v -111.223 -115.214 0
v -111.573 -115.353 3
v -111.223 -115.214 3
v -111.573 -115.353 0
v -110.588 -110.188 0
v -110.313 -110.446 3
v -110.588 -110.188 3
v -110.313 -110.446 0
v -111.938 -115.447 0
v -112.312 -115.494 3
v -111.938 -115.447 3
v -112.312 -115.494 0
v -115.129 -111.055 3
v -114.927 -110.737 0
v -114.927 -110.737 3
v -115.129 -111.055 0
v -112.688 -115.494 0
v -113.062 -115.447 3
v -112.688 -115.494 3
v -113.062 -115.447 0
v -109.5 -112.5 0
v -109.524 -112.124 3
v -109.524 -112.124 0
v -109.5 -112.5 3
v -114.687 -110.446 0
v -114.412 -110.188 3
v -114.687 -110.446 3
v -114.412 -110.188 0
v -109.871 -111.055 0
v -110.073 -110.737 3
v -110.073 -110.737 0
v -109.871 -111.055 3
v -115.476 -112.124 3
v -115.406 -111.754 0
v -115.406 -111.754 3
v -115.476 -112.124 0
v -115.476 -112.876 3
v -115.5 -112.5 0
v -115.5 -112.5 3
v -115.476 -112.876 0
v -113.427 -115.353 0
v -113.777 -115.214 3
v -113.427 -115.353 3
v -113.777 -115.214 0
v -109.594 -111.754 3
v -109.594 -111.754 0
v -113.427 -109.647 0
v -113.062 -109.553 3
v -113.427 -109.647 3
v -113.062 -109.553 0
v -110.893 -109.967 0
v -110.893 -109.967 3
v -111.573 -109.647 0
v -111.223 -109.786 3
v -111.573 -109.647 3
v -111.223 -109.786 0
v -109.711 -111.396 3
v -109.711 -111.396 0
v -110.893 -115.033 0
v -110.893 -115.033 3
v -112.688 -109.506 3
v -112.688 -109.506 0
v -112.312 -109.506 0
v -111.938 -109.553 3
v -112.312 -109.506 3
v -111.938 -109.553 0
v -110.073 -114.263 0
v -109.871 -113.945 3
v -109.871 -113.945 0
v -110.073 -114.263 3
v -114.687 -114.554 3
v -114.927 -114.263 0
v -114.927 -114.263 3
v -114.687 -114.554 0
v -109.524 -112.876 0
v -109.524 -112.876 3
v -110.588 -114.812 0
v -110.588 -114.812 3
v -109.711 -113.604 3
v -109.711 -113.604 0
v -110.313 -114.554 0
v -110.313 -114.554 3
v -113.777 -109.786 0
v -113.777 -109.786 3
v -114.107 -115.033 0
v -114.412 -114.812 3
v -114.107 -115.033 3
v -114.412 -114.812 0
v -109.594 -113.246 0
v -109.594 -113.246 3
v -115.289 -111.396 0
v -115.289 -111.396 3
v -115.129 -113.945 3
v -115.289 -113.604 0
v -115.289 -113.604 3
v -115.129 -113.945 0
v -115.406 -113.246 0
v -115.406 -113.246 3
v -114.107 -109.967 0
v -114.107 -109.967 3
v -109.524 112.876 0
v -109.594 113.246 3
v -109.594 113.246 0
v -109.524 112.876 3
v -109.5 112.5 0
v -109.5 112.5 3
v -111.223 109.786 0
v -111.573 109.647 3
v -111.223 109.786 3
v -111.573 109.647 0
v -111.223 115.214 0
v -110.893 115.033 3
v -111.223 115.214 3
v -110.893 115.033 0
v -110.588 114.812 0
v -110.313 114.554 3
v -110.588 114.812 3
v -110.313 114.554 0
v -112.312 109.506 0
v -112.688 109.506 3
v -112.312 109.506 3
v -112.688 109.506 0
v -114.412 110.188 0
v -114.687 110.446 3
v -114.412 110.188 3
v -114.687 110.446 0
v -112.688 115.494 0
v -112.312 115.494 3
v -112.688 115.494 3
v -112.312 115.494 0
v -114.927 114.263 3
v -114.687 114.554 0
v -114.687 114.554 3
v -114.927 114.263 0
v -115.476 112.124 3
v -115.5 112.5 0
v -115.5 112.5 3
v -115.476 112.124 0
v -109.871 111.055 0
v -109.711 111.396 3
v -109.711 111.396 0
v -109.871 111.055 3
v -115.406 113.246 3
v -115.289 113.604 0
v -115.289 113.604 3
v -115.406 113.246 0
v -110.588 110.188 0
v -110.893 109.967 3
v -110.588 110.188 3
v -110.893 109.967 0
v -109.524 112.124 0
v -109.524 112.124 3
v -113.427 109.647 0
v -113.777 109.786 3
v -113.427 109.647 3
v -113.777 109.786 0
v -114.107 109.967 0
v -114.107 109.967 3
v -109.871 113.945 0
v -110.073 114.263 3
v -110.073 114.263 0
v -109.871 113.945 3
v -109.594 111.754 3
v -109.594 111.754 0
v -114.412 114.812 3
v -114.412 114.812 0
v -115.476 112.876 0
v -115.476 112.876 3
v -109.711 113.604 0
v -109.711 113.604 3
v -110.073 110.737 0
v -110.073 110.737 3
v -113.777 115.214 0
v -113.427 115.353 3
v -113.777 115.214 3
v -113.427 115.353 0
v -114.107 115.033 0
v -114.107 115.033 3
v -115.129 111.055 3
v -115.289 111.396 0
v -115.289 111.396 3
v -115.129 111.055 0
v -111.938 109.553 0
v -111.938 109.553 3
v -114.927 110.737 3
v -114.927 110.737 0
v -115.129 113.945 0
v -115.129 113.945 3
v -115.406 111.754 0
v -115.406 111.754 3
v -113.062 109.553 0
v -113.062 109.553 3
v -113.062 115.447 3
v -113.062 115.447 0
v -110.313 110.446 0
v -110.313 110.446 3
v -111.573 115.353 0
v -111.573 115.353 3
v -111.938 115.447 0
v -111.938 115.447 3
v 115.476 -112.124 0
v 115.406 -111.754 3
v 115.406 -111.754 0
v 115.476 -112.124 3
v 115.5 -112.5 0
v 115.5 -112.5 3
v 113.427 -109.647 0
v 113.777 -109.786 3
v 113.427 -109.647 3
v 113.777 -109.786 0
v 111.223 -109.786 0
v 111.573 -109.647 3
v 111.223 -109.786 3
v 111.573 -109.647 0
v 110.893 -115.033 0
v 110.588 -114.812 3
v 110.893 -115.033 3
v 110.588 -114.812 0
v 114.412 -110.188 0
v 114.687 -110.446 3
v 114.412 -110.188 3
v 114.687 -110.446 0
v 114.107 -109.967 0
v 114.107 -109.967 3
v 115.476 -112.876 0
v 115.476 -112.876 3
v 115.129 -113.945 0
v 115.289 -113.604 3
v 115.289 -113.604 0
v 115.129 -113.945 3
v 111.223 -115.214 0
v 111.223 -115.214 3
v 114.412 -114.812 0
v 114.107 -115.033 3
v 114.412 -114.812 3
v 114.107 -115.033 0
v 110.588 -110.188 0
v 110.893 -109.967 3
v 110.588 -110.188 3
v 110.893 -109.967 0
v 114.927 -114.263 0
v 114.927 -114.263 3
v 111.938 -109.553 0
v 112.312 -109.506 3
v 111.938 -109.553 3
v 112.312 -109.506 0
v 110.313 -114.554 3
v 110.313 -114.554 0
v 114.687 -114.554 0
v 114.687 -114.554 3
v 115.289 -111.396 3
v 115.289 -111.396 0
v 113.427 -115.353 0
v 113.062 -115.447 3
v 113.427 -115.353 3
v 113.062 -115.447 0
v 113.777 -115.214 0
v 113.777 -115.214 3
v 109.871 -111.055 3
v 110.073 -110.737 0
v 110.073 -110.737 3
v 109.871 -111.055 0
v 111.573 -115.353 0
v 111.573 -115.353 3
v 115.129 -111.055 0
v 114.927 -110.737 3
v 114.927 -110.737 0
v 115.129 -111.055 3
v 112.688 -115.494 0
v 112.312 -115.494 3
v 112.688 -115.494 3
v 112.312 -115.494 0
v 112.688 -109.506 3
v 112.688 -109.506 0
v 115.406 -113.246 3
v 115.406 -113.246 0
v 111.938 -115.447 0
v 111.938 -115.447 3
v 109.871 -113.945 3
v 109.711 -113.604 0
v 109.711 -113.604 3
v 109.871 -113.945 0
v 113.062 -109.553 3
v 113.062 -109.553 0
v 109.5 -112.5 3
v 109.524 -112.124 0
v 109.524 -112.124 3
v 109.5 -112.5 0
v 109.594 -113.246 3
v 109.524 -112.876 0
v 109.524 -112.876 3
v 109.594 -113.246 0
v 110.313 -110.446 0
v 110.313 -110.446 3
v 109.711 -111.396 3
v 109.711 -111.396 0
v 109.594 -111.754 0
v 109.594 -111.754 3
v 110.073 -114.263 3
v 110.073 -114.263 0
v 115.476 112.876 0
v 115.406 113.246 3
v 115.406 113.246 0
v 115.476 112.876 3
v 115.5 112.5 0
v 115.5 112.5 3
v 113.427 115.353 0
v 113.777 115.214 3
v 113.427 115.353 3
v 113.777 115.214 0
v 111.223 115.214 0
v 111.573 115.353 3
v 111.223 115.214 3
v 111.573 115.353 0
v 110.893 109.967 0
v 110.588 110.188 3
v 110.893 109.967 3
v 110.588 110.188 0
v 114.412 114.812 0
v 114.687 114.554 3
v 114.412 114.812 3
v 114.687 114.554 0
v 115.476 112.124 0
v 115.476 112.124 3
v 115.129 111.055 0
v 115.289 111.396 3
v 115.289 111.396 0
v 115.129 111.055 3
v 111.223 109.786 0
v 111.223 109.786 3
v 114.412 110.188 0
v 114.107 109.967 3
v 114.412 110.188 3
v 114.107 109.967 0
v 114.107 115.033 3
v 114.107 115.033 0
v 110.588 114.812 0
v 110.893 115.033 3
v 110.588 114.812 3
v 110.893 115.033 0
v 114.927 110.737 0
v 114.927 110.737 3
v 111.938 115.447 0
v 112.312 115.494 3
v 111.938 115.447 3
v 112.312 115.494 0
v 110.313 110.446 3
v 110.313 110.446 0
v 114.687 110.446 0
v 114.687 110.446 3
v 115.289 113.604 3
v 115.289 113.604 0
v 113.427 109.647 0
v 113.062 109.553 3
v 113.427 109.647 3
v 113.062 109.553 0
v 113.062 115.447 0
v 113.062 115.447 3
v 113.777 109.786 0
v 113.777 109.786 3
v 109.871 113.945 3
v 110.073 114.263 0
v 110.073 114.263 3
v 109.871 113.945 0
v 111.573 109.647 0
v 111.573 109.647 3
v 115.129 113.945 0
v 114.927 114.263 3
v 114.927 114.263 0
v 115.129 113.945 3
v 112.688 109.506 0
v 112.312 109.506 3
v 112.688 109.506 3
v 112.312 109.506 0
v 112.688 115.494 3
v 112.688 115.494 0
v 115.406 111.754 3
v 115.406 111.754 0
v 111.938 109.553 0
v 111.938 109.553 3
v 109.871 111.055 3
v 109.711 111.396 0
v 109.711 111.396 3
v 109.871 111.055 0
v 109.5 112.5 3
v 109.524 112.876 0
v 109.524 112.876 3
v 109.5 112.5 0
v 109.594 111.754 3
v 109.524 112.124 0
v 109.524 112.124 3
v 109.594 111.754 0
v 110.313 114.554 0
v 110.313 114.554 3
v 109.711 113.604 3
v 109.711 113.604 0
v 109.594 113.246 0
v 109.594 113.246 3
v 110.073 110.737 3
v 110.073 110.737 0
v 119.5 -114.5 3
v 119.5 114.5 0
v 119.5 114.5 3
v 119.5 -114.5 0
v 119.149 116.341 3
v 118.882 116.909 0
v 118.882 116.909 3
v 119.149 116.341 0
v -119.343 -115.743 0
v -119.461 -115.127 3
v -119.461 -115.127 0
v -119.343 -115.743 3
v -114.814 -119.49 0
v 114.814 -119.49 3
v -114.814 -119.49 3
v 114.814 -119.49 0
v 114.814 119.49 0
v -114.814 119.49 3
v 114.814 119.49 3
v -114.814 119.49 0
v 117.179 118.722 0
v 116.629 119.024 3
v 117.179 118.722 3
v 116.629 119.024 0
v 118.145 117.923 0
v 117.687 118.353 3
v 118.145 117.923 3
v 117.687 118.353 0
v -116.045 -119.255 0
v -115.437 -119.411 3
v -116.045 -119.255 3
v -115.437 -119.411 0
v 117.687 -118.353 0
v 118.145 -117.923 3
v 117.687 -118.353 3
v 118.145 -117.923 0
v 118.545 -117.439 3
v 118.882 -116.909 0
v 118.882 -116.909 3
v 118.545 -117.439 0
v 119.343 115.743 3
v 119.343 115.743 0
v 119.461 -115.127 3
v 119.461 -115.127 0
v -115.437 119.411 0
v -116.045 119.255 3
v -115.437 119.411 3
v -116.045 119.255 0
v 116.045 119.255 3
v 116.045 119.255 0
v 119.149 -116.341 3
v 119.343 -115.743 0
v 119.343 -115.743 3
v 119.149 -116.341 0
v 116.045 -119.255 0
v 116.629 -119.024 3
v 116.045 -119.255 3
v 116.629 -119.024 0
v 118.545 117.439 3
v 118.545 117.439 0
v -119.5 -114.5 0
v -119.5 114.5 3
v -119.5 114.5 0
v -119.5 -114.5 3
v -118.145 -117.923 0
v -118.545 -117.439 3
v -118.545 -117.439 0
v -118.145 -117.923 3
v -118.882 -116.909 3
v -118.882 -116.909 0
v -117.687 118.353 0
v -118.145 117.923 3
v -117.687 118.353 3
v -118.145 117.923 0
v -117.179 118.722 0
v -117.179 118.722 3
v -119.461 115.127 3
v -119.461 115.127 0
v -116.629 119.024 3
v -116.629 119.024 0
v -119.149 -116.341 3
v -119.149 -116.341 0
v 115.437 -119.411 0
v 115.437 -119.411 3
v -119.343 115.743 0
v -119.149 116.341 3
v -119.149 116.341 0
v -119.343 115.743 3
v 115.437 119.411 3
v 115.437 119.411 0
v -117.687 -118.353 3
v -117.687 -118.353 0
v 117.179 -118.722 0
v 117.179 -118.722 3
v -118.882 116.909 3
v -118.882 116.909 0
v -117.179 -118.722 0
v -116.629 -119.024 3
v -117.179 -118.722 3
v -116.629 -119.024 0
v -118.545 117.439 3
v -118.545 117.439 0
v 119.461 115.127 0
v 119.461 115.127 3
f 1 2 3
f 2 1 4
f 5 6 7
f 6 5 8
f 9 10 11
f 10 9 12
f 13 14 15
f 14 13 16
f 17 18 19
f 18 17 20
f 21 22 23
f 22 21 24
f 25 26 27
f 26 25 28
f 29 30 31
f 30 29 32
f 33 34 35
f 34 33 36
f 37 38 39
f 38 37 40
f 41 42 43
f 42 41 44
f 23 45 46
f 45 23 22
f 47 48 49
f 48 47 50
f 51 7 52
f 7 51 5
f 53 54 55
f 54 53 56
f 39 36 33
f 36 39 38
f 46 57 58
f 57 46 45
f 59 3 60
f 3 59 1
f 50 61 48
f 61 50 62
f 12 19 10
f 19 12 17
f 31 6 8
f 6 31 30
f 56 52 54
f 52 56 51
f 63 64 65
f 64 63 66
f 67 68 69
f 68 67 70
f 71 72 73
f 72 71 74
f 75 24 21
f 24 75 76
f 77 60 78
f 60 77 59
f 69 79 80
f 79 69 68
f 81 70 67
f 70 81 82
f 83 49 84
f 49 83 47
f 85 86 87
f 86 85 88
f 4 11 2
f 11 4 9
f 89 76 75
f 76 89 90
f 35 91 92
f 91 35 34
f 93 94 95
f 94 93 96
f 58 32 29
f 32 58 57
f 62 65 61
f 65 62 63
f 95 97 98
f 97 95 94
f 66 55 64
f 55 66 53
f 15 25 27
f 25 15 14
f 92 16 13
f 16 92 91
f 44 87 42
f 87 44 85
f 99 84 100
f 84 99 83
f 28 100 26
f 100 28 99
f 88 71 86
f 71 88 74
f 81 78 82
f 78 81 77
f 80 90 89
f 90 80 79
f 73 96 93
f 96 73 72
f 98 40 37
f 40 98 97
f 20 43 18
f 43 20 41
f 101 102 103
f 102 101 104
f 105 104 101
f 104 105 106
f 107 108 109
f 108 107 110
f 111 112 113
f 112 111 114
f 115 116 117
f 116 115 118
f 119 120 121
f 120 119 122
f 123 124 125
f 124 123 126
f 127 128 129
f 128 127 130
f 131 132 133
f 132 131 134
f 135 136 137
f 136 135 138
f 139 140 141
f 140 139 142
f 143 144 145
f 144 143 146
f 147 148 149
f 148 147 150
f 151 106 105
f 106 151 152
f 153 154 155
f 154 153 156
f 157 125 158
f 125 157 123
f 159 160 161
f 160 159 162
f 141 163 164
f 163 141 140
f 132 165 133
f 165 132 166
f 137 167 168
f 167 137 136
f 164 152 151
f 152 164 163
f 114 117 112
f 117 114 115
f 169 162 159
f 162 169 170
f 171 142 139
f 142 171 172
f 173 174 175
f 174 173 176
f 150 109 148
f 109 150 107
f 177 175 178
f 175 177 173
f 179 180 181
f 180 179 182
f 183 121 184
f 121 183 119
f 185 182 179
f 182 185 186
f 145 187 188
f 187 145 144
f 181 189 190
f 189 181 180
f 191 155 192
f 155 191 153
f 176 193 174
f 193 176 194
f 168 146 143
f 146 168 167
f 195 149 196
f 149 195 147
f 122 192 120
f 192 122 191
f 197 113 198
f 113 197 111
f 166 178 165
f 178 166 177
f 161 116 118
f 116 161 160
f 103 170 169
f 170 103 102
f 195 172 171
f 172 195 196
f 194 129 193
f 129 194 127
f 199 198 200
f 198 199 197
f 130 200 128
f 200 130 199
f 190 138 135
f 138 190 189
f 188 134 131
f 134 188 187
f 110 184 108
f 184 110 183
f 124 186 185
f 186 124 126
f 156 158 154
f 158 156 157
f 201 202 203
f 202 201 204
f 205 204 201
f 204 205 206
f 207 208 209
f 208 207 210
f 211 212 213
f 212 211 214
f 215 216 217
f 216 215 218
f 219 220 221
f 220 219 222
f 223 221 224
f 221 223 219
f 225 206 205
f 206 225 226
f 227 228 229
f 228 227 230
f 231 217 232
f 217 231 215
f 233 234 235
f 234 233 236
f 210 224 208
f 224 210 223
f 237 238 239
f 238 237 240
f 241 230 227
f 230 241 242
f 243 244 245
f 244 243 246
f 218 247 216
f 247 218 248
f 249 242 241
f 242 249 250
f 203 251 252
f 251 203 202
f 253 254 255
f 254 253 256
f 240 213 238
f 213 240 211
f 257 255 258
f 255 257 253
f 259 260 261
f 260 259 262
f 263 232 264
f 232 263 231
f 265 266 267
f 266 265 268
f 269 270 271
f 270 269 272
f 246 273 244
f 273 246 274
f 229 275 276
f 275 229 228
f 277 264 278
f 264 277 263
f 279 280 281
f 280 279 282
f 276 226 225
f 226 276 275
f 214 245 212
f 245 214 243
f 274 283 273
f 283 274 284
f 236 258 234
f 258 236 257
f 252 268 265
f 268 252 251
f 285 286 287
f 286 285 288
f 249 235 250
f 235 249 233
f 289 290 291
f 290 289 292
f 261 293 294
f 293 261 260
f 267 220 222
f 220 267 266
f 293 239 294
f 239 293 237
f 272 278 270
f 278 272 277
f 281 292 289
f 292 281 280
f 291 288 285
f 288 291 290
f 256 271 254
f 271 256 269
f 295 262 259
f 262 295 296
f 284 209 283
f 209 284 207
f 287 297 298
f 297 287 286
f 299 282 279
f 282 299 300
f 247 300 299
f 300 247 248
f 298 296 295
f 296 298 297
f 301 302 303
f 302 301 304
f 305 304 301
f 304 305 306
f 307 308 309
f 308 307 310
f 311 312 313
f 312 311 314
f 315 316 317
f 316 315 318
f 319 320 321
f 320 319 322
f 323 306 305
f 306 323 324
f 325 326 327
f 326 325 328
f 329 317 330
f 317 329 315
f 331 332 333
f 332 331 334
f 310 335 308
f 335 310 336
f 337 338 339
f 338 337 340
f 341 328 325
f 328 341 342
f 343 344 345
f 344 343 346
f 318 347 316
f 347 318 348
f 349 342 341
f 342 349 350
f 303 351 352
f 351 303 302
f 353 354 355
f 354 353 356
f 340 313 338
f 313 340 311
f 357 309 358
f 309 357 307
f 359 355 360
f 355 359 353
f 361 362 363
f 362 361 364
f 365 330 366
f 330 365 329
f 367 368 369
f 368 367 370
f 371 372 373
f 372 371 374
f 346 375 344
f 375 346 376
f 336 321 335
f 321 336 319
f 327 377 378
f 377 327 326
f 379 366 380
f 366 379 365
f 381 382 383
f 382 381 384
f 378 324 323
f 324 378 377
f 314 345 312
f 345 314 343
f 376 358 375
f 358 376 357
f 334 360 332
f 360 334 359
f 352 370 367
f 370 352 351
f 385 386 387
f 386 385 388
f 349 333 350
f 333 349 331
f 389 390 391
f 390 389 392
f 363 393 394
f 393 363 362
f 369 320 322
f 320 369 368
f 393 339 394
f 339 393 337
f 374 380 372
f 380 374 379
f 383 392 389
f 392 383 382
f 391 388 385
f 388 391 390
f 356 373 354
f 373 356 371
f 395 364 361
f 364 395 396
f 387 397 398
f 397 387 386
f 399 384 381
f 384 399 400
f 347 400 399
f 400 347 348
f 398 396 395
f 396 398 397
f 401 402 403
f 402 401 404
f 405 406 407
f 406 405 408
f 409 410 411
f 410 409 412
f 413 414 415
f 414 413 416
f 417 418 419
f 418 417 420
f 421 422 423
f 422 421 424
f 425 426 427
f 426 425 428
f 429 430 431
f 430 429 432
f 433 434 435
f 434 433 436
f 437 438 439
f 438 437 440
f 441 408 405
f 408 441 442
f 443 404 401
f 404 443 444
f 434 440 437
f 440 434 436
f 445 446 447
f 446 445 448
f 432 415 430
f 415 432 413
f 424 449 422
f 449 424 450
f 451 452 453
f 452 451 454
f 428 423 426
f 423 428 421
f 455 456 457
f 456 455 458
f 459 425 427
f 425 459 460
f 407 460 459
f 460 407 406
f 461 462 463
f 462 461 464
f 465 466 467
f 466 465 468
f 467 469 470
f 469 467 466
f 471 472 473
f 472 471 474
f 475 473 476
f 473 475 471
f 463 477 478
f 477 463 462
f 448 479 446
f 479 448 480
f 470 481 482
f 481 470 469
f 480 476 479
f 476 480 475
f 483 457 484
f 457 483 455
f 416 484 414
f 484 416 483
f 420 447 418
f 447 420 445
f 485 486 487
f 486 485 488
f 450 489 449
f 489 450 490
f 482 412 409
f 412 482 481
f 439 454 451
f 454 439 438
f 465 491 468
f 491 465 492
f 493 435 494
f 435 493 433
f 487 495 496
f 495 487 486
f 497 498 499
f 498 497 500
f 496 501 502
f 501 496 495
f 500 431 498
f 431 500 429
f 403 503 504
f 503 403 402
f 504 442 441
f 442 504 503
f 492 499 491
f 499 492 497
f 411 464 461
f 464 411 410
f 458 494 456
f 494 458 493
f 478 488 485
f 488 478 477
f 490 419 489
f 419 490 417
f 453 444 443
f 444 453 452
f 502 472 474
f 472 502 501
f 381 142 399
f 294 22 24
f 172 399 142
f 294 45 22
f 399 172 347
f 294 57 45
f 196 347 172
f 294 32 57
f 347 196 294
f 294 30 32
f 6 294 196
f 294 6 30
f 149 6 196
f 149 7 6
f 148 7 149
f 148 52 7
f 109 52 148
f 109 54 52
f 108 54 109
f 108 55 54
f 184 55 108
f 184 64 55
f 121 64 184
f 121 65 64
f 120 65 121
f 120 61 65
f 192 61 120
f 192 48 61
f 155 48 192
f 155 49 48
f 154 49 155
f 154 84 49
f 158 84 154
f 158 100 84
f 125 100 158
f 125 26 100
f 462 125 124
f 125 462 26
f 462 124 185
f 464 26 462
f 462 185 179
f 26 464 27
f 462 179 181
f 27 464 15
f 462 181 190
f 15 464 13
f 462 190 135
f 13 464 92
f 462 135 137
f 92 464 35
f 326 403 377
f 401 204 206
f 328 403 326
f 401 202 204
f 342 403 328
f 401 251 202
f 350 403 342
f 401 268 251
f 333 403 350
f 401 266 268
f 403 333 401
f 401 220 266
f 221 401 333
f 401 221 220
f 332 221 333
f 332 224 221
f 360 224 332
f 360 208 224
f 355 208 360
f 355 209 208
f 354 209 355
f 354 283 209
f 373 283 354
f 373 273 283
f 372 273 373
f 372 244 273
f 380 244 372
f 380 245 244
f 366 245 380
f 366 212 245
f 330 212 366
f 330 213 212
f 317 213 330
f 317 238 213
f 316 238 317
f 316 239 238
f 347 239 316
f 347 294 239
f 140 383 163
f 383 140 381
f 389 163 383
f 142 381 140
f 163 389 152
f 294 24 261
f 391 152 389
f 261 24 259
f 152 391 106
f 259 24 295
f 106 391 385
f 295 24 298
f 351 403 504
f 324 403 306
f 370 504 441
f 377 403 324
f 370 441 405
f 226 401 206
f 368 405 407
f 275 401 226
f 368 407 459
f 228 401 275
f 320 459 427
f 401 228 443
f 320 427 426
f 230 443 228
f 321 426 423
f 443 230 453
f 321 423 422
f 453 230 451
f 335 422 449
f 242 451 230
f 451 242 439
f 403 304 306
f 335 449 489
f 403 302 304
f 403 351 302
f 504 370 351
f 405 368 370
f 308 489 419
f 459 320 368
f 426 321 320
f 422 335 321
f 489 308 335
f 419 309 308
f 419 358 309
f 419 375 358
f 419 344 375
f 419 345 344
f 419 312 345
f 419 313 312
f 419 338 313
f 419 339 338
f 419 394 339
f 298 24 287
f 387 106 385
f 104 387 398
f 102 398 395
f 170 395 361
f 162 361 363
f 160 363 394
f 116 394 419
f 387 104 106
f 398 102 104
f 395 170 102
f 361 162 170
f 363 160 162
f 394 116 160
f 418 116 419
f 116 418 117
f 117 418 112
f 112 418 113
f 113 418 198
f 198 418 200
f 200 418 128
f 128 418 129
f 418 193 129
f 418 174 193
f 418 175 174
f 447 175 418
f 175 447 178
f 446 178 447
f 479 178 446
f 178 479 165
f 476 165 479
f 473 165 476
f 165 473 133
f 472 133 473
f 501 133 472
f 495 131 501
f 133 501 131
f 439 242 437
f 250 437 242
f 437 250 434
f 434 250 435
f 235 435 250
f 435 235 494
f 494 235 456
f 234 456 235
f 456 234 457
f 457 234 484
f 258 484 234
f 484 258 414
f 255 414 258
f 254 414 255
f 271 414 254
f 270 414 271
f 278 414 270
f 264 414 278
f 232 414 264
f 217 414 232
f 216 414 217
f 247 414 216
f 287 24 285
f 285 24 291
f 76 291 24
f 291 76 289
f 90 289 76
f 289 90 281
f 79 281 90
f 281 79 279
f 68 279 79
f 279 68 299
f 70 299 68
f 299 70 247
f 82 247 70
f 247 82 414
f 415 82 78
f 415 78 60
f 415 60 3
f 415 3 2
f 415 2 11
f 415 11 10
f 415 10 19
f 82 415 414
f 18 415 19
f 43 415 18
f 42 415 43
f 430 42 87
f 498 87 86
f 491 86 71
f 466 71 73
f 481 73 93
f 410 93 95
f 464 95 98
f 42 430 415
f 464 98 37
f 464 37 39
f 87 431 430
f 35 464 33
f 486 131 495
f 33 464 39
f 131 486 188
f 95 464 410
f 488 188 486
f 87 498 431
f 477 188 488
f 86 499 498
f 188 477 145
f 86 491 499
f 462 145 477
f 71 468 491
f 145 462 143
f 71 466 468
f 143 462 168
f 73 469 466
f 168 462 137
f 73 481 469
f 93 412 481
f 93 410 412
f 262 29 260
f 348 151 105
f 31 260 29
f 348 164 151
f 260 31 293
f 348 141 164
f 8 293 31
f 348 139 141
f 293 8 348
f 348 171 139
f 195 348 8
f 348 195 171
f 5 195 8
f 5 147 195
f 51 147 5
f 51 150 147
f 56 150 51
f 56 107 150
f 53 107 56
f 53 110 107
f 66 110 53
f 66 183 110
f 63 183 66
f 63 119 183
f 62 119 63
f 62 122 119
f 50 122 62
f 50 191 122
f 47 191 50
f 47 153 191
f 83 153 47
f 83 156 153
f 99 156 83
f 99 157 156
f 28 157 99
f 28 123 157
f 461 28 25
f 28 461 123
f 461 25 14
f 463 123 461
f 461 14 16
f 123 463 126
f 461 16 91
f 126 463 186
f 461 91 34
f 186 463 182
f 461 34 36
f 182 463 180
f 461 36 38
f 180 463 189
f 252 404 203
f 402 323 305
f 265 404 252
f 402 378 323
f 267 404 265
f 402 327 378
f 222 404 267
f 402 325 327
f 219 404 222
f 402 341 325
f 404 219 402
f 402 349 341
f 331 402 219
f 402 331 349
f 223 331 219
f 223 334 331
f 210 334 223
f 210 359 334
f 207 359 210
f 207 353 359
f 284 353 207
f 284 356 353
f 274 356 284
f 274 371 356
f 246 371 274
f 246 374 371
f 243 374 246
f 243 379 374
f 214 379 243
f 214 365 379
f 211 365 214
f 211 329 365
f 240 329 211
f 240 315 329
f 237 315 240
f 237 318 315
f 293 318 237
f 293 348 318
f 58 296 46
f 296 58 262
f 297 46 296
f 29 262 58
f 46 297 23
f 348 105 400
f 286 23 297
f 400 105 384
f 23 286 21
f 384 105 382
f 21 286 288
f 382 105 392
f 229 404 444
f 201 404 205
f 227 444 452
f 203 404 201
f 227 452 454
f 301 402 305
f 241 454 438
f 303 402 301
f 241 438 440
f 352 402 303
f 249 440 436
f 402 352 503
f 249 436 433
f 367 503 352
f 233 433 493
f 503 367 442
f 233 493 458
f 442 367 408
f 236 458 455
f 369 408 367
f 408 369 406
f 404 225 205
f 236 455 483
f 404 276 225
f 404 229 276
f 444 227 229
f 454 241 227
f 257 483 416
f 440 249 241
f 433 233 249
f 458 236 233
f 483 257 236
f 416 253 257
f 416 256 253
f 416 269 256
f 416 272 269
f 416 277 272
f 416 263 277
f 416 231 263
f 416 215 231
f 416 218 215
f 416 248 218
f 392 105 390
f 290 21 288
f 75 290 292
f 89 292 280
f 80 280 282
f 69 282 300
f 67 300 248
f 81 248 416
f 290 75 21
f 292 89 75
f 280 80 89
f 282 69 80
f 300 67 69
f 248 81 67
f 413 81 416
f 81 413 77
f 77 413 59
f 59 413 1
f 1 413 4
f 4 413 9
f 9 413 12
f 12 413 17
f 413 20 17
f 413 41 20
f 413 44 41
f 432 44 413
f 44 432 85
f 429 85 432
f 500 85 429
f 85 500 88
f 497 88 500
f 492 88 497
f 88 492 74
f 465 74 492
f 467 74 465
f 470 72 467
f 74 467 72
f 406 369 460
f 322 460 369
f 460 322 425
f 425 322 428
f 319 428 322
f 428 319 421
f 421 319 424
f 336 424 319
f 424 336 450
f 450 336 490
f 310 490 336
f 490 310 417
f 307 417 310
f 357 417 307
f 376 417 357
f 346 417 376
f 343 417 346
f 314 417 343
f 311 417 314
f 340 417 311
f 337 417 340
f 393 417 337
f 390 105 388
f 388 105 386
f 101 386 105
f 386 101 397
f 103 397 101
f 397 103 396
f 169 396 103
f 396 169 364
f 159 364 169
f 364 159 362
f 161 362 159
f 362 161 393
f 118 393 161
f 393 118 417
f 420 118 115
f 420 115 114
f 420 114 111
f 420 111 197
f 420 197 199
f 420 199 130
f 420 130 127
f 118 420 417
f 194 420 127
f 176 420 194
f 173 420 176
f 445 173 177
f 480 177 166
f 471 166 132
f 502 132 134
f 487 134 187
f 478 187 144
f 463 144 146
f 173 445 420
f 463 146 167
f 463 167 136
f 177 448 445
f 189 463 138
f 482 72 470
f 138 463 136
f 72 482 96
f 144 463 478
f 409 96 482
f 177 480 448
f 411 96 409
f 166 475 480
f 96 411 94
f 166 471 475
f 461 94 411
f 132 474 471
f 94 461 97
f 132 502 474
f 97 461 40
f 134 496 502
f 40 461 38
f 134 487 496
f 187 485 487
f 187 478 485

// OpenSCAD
$fn = 50;


difference() {
	union() {
		hull() {
			translate(v = [-114.5000000000, 114.5000000000, 0]) {
				cylinder(h = 3, r = 5);
			}
			translate(v = [114.5000000000, 114.5000000000, 0]) {
				cylinder(h = 3, r = 5);
			}
			translate(v = [-114.5000000000, -114.5000000000, 0]) {
				cylinder(h = 3, r = 5);
			}
			translate(v = [114.5000000000, -114.5000000000, 0]) {
				cylinder(h = 3, r = 5);
			}
		}
	}
	union() {
		translate(v = [-112.5000000000, -112.5000000000, -100.0000000000]) {
			cylinder(h = 200, r = 3.0000000000);
		}
		translate(v = [-112.5000000000, 112.5000000000, -100.0000000000]) {
			cylinder(h = 200, r = 3.0000000000);
		}
		translate(v = [112.5000000000, -112.5000000000, -100.0000000000]) {
			cylinder(h = 200, r = 3.0000000000);
		}
		translate(v = [112.5000000000, 112.5000000000, -100.0000000000]) {
			cylinder(h = 200, r = 3.0000000000);
		}
	}
}
